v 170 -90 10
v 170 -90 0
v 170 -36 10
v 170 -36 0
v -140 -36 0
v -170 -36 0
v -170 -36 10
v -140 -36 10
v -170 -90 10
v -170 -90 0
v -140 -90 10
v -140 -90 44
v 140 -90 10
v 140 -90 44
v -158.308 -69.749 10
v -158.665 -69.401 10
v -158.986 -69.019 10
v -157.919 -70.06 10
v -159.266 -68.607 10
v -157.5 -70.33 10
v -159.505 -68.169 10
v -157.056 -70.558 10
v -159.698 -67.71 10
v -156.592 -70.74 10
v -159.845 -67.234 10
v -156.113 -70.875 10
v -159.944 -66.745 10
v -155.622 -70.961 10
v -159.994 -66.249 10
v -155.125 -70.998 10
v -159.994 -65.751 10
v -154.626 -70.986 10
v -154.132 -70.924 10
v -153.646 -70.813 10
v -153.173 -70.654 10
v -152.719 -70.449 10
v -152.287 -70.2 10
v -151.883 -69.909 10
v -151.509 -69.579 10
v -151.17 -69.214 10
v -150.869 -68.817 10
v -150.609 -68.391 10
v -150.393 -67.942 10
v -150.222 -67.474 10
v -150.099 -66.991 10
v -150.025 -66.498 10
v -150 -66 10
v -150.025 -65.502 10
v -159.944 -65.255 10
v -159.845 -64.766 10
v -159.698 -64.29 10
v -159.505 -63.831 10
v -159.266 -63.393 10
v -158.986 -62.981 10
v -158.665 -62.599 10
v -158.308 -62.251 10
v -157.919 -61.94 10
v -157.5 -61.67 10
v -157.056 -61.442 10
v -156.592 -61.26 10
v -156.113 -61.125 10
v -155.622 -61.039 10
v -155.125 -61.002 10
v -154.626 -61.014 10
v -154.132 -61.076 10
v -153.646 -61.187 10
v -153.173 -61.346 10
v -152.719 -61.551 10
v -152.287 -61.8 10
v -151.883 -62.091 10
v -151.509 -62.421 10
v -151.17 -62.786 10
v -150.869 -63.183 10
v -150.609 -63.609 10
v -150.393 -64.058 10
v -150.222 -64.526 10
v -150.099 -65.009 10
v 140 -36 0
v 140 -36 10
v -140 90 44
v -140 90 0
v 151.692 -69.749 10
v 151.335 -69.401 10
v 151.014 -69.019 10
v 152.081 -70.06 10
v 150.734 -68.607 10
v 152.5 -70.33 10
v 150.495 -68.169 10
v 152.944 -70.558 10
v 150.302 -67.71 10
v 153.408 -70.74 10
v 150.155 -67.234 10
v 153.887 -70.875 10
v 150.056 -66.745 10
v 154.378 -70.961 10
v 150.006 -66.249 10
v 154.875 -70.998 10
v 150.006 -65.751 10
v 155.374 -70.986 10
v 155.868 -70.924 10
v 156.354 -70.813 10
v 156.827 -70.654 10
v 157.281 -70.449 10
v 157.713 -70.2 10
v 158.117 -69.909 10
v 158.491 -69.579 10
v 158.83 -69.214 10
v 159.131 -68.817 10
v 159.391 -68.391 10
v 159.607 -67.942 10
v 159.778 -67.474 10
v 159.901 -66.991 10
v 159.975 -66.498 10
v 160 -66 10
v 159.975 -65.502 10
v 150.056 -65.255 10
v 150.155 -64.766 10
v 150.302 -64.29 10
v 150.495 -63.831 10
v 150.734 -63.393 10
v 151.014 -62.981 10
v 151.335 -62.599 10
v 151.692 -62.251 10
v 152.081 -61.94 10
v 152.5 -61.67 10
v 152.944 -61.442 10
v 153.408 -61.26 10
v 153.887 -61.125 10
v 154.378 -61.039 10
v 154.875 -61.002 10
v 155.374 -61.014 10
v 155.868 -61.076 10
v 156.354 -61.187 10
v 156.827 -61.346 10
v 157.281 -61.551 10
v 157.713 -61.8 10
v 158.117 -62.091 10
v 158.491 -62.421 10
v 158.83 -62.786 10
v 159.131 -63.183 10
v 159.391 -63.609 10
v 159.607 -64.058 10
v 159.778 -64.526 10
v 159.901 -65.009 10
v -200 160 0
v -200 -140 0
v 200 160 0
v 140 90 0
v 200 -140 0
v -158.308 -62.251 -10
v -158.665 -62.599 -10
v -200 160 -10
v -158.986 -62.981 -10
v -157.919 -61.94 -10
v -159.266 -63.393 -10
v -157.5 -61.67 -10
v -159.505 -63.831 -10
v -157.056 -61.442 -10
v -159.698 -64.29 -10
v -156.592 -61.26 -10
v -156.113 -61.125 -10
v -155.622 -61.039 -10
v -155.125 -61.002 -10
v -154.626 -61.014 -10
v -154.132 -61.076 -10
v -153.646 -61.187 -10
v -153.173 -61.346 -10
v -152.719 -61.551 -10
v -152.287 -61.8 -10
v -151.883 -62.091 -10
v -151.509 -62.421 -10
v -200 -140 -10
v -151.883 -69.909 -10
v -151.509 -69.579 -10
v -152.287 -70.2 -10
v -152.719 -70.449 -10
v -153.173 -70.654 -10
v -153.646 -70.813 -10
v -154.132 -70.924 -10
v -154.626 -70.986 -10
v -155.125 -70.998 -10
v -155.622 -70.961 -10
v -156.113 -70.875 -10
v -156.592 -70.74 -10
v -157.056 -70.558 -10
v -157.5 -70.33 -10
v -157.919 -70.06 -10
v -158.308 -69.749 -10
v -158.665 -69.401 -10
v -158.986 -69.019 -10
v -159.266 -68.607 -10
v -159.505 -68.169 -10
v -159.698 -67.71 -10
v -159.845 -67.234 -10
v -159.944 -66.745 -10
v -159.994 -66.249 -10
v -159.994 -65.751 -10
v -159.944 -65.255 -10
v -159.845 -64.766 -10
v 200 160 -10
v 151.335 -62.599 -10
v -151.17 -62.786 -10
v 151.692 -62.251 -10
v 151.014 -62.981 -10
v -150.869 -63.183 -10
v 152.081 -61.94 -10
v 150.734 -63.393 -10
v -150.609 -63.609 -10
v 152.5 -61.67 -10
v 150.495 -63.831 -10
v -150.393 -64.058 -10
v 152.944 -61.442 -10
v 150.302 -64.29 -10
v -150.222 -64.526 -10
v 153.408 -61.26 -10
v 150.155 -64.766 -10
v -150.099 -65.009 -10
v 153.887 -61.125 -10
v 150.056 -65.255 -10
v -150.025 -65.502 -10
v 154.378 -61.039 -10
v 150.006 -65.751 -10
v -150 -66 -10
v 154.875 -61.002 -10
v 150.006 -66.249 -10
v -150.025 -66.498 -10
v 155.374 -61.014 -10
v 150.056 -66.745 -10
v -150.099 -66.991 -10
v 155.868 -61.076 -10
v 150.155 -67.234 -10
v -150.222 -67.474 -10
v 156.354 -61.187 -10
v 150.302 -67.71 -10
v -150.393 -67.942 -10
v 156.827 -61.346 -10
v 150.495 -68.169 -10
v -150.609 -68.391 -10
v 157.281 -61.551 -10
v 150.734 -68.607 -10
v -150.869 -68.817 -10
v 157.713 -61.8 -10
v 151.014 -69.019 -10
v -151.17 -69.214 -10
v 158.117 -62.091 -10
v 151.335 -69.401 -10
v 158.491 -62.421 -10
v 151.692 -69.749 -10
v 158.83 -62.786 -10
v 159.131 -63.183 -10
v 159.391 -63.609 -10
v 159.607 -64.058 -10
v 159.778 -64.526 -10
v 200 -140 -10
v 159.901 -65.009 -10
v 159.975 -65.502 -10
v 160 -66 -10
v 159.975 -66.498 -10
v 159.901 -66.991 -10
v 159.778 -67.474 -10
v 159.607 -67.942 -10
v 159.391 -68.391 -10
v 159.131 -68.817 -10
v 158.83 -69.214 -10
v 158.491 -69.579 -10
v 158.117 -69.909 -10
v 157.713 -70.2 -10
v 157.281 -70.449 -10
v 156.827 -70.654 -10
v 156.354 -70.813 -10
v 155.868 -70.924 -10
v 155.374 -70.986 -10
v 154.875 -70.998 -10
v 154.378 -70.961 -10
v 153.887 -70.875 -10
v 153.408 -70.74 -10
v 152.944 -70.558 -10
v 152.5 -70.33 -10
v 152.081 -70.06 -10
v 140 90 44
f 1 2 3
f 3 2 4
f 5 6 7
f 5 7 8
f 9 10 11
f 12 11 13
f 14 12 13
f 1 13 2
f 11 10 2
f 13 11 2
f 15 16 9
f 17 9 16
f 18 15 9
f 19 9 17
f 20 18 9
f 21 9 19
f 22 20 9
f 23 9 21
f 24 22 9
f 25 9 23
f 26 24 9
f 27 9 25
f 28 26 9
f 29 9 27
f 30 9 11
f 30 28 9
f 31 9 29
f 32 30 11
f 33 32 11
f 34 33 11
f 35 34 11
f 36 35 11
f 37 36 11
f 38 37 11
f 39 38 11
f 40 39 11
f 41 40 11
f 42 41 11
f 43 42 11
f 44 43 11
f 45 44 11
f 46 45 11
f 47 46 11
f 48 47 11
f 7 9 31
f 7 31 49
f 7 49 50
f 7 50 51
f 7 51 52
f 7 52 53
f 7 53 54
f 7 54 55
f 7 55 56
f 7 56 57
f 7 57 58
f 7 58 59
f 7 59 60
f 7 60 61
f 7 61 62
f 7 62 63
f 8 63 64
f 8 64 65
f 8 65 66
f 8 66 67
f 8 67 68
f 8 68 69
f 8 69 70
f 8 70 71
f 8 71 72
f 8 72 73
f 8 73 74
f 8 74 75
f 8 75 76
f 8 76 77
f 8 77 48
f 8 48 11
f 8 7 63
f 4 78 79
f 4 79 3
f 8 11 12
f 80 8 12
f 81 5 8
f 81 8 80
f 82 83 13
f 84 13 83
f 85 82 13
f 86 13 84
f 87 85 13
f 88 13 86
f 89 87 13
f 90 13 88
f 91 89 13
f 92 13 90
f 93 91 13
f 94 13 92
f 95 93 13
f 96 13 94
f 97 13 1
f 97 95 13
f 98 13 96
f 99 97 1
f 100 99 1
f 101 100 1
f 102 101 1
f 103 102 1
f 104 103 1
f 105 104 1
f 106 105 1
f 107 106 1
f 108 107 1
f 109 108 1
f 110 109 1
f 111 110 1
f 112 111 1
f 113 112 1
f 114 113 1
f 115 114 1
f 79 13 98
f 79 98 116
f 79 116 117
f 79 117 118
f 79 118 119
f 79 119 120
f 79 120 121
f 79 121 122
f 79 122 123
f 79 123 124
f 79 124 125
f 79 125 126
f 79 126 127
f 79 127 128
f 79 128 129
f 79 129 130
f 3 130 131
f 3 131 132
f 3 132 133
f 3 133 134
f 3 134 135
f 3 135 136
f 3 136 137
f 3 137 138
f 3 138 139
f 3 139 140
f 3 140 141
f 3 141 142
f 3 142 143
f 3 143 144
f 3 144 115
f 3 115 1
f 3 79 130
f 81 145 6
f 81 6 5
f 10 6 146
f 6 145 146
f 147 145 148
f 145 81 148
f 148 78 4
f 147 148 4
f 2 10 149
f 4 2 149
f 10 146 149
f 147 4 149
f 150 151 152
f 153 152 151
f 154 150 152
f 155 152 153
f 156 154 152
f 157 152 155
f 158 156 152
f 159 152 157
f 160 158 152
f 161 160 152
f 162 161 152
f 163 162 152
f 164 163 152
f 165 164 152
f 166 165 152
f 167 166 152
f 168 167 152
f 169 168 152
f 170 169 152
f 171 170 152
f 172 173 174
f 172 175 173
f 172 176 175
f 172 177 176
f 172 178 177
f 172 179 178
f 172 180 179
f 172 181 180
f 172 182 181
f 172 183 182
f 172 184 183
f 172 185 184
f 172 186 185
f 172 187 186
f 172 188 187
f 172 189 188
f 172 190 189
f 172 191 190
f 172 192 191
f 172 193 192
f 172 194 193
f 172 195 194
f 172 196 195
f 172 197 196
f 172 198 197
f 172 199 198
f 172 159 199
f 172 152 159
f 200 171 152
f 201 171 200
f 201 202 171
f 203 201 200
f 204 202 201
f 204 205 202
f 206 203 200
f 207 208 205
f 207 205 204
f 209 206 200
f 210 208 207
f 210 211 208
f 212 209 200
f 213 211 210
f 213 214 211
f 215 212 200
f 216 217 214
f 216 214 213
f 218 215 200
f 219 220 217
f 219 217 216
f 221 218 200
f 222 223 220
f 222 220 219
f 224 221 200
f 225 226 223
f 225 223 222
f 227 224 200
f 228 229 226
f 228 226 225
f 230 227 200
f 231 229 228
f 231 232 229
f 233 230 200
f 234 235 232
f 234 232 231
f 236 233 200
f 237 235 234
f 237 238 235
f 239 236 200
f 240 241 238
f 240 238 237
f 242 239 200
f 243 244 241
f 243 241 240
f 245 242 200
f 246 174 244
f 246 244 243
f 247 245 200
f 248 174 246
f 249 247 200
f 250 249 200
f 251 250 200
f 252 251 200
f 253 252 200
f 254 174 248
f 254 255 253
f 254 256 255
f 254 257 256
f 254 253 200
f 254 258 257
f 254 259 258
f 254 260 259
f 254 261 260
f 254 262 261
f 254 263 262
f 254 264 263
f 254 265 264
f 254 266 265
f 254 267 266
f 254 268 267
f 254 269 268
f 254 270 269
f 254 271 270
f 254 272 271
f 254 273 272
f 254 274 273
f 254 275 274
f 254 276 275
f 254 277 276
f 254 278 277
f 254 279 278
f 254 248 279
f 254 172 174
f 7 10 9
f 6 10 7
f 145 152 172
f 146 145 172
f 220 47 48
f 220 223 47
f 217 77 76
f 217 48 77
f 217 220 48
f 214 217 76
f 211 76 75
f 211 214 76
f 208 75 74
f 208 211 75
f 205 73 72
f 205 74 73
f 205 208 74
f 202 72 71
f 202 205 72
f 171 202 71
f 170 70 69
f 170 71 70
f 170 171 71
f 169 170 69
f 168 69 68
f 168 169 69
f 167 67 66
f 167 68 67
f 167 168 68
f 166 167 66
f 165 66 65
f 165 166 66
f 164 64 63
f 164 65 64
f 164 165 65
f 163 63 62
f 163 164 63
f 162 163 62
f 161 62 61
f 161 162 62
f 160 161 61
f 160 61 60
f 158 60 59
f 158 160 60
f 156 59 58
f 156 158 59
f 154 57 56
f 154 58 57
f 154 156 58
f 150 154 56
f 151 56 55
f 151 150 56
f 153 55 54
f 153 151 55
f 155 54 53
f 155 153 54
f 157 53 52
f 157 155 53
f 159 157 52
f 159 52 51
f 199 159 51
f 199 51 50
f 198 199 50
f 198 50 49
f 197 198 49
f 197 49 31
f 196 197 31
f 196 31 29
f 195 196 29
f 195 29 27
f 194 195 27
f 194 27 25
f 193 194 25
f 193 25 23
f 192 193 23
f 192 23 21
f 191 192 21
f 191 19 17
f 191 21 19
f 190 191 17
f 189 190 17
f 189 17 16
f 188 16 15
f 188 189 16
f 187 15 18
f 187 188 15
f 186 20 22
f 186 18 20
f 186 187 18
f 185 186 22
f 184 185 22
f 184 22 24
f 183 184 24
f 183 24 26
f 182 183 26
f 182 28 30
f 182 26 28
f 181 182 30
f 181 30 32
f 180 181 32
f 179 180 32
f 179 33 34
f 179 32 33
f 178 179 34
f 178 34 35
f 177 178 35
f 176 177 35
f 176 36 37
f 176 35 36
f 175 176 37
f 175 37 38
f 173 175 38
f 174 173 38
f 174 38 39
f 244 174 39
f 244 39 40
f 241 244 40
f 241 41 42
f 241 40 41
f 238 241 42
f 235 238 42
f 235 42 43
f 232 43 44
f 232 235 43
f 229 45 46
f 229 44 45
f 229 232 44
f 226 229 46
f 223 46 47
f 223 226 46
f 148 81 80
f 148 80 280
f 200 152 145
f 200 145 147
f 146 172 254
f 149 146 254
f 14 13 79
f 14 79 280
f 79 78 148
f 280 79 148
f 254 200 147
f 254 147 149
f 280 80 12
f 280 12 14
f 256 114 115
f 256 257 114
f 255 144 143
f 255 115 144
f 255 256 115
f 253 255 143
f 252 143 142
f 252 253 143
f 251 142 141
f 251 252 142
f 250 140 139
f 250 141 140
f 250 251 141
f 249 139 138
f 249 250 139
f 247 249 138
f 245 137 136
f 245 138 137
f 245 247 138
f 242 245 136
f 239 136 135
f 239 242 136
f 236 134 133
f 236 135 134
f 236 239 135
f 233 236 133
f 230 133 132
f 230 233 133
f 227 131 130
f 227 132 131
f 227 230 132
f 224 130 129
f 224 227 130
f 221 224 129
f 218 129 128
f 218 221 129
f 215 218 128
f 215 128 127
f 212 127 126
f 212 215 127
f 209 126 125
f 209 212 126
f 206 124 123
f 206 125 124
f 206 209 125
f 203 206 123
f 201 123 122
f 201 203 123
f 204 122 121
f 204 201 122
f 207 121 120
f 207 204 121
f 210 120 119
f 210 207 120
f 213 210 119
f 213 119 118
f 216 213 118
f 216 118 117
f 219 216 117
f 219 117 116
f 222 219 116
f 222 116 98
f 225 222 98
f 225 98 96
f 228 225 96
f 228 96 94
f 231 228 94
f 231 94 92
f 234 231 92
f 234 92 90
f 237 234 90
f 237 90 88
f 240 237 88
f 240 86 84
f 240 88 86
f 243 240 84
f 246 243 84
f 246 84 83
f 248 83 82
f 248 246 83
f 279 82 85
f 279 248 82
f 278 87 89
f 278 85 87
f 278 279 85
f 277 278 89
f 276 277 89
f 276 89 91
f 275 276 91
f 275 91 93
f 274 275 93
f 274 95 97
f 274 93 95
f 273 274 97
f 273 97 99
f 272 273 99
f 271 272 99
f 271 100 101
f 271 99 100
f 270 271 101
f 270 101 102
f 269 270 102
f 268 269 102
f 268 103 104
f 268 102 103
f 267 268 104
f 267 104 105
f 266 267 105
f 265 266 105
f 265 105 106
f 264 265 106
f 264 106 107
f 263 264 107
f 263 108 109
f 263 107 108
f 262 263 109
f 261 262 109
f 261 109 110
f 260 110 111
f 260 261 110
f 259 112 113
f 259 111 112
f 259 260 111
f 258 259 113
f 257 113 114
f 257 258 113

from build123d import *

# Parameters (mm, degrees)
CYLINDER001_R     = 5
CYLINDER001_DEPTH = 50
CYLINDER_R        = 5
CYLINDER_DEPTH    = 50
SKETCH_W          = 280
SKETCH_H          = 180
PAD_DEPTH         = 44
SKETCH001_W       = 30
SKETCH001_H       = 54
PAD001_DEPTH      = 10
SKETCH002_W       = 400
SKETCH002_H       = 300
PAD002_DEPTH      = 10


with BuildPart() as cylinder001:
    # Cylinder001 → Cylinder001 (new body)
    with BuildSketch(Plane(origin=(-155, -66, -30), x_dir=(1, 0, 0), z_dir=(0, 0, 1))):
        Circle(CYLINDER001_R)
    extrude(amount=CYLINDER001_DEPTH)


with BuildPart() as cylinder:
    # Cylinder → Cylinder (new body)
    with BuildSketch(Plane(origin=(155, -66, -25), x_dir=(1, 0, 0), z_dir=(0, 0, 1))):
        Circle(CYLINDER_R)
    extrude(amount=CYLINDER_DEPTH)


with BuildPart() as pad:
    # Sketch → Pad (new body)
    with BuildSketch(Plane.XY):
        Rectangle(SKETCH_W, SKETCH_H)
    extrude(amount=PAD_DEPTH)


with BuildPart() as fusion:
    # Sketch001 → Pad001 (new body)
    with BuildSketch(Plane.XY):
        with Locations((155, -63)):
            Rectangle(SKETCH001_W, SKETCH001_H)
        with Locations((-155, -63)):
            Rectangle(SKETCH001_W, SKETCH001_H)
    extrude(amount=PAD001_DEPTH)

    # Fusion: union Pad
    add(pad.part)


with BuildPart() as cut001:
    # Sketch002 → Pad002 (new body)
    with BuildSketch(Plane(origin=(0, 0, -10), x_dir=(1, 0, 0), z_dir=(0, 0, -1))):
        with Locations((0, -10)):
            Rectangle(SKETCH002_W, SKETCH002_H)
    extrude(amount=-PAD002_DEPTH)

    # Fusion001: union Fusion
    add(fusion.part)

    # Cut: cut Cylinder
    add(cylinder.part, mode=Mode.SUBTRACT)

    # Cut001: cut Cylinder001
    add(cylinder001.part, mode=Mode.SUBTRACT)


solid = cut001.part
